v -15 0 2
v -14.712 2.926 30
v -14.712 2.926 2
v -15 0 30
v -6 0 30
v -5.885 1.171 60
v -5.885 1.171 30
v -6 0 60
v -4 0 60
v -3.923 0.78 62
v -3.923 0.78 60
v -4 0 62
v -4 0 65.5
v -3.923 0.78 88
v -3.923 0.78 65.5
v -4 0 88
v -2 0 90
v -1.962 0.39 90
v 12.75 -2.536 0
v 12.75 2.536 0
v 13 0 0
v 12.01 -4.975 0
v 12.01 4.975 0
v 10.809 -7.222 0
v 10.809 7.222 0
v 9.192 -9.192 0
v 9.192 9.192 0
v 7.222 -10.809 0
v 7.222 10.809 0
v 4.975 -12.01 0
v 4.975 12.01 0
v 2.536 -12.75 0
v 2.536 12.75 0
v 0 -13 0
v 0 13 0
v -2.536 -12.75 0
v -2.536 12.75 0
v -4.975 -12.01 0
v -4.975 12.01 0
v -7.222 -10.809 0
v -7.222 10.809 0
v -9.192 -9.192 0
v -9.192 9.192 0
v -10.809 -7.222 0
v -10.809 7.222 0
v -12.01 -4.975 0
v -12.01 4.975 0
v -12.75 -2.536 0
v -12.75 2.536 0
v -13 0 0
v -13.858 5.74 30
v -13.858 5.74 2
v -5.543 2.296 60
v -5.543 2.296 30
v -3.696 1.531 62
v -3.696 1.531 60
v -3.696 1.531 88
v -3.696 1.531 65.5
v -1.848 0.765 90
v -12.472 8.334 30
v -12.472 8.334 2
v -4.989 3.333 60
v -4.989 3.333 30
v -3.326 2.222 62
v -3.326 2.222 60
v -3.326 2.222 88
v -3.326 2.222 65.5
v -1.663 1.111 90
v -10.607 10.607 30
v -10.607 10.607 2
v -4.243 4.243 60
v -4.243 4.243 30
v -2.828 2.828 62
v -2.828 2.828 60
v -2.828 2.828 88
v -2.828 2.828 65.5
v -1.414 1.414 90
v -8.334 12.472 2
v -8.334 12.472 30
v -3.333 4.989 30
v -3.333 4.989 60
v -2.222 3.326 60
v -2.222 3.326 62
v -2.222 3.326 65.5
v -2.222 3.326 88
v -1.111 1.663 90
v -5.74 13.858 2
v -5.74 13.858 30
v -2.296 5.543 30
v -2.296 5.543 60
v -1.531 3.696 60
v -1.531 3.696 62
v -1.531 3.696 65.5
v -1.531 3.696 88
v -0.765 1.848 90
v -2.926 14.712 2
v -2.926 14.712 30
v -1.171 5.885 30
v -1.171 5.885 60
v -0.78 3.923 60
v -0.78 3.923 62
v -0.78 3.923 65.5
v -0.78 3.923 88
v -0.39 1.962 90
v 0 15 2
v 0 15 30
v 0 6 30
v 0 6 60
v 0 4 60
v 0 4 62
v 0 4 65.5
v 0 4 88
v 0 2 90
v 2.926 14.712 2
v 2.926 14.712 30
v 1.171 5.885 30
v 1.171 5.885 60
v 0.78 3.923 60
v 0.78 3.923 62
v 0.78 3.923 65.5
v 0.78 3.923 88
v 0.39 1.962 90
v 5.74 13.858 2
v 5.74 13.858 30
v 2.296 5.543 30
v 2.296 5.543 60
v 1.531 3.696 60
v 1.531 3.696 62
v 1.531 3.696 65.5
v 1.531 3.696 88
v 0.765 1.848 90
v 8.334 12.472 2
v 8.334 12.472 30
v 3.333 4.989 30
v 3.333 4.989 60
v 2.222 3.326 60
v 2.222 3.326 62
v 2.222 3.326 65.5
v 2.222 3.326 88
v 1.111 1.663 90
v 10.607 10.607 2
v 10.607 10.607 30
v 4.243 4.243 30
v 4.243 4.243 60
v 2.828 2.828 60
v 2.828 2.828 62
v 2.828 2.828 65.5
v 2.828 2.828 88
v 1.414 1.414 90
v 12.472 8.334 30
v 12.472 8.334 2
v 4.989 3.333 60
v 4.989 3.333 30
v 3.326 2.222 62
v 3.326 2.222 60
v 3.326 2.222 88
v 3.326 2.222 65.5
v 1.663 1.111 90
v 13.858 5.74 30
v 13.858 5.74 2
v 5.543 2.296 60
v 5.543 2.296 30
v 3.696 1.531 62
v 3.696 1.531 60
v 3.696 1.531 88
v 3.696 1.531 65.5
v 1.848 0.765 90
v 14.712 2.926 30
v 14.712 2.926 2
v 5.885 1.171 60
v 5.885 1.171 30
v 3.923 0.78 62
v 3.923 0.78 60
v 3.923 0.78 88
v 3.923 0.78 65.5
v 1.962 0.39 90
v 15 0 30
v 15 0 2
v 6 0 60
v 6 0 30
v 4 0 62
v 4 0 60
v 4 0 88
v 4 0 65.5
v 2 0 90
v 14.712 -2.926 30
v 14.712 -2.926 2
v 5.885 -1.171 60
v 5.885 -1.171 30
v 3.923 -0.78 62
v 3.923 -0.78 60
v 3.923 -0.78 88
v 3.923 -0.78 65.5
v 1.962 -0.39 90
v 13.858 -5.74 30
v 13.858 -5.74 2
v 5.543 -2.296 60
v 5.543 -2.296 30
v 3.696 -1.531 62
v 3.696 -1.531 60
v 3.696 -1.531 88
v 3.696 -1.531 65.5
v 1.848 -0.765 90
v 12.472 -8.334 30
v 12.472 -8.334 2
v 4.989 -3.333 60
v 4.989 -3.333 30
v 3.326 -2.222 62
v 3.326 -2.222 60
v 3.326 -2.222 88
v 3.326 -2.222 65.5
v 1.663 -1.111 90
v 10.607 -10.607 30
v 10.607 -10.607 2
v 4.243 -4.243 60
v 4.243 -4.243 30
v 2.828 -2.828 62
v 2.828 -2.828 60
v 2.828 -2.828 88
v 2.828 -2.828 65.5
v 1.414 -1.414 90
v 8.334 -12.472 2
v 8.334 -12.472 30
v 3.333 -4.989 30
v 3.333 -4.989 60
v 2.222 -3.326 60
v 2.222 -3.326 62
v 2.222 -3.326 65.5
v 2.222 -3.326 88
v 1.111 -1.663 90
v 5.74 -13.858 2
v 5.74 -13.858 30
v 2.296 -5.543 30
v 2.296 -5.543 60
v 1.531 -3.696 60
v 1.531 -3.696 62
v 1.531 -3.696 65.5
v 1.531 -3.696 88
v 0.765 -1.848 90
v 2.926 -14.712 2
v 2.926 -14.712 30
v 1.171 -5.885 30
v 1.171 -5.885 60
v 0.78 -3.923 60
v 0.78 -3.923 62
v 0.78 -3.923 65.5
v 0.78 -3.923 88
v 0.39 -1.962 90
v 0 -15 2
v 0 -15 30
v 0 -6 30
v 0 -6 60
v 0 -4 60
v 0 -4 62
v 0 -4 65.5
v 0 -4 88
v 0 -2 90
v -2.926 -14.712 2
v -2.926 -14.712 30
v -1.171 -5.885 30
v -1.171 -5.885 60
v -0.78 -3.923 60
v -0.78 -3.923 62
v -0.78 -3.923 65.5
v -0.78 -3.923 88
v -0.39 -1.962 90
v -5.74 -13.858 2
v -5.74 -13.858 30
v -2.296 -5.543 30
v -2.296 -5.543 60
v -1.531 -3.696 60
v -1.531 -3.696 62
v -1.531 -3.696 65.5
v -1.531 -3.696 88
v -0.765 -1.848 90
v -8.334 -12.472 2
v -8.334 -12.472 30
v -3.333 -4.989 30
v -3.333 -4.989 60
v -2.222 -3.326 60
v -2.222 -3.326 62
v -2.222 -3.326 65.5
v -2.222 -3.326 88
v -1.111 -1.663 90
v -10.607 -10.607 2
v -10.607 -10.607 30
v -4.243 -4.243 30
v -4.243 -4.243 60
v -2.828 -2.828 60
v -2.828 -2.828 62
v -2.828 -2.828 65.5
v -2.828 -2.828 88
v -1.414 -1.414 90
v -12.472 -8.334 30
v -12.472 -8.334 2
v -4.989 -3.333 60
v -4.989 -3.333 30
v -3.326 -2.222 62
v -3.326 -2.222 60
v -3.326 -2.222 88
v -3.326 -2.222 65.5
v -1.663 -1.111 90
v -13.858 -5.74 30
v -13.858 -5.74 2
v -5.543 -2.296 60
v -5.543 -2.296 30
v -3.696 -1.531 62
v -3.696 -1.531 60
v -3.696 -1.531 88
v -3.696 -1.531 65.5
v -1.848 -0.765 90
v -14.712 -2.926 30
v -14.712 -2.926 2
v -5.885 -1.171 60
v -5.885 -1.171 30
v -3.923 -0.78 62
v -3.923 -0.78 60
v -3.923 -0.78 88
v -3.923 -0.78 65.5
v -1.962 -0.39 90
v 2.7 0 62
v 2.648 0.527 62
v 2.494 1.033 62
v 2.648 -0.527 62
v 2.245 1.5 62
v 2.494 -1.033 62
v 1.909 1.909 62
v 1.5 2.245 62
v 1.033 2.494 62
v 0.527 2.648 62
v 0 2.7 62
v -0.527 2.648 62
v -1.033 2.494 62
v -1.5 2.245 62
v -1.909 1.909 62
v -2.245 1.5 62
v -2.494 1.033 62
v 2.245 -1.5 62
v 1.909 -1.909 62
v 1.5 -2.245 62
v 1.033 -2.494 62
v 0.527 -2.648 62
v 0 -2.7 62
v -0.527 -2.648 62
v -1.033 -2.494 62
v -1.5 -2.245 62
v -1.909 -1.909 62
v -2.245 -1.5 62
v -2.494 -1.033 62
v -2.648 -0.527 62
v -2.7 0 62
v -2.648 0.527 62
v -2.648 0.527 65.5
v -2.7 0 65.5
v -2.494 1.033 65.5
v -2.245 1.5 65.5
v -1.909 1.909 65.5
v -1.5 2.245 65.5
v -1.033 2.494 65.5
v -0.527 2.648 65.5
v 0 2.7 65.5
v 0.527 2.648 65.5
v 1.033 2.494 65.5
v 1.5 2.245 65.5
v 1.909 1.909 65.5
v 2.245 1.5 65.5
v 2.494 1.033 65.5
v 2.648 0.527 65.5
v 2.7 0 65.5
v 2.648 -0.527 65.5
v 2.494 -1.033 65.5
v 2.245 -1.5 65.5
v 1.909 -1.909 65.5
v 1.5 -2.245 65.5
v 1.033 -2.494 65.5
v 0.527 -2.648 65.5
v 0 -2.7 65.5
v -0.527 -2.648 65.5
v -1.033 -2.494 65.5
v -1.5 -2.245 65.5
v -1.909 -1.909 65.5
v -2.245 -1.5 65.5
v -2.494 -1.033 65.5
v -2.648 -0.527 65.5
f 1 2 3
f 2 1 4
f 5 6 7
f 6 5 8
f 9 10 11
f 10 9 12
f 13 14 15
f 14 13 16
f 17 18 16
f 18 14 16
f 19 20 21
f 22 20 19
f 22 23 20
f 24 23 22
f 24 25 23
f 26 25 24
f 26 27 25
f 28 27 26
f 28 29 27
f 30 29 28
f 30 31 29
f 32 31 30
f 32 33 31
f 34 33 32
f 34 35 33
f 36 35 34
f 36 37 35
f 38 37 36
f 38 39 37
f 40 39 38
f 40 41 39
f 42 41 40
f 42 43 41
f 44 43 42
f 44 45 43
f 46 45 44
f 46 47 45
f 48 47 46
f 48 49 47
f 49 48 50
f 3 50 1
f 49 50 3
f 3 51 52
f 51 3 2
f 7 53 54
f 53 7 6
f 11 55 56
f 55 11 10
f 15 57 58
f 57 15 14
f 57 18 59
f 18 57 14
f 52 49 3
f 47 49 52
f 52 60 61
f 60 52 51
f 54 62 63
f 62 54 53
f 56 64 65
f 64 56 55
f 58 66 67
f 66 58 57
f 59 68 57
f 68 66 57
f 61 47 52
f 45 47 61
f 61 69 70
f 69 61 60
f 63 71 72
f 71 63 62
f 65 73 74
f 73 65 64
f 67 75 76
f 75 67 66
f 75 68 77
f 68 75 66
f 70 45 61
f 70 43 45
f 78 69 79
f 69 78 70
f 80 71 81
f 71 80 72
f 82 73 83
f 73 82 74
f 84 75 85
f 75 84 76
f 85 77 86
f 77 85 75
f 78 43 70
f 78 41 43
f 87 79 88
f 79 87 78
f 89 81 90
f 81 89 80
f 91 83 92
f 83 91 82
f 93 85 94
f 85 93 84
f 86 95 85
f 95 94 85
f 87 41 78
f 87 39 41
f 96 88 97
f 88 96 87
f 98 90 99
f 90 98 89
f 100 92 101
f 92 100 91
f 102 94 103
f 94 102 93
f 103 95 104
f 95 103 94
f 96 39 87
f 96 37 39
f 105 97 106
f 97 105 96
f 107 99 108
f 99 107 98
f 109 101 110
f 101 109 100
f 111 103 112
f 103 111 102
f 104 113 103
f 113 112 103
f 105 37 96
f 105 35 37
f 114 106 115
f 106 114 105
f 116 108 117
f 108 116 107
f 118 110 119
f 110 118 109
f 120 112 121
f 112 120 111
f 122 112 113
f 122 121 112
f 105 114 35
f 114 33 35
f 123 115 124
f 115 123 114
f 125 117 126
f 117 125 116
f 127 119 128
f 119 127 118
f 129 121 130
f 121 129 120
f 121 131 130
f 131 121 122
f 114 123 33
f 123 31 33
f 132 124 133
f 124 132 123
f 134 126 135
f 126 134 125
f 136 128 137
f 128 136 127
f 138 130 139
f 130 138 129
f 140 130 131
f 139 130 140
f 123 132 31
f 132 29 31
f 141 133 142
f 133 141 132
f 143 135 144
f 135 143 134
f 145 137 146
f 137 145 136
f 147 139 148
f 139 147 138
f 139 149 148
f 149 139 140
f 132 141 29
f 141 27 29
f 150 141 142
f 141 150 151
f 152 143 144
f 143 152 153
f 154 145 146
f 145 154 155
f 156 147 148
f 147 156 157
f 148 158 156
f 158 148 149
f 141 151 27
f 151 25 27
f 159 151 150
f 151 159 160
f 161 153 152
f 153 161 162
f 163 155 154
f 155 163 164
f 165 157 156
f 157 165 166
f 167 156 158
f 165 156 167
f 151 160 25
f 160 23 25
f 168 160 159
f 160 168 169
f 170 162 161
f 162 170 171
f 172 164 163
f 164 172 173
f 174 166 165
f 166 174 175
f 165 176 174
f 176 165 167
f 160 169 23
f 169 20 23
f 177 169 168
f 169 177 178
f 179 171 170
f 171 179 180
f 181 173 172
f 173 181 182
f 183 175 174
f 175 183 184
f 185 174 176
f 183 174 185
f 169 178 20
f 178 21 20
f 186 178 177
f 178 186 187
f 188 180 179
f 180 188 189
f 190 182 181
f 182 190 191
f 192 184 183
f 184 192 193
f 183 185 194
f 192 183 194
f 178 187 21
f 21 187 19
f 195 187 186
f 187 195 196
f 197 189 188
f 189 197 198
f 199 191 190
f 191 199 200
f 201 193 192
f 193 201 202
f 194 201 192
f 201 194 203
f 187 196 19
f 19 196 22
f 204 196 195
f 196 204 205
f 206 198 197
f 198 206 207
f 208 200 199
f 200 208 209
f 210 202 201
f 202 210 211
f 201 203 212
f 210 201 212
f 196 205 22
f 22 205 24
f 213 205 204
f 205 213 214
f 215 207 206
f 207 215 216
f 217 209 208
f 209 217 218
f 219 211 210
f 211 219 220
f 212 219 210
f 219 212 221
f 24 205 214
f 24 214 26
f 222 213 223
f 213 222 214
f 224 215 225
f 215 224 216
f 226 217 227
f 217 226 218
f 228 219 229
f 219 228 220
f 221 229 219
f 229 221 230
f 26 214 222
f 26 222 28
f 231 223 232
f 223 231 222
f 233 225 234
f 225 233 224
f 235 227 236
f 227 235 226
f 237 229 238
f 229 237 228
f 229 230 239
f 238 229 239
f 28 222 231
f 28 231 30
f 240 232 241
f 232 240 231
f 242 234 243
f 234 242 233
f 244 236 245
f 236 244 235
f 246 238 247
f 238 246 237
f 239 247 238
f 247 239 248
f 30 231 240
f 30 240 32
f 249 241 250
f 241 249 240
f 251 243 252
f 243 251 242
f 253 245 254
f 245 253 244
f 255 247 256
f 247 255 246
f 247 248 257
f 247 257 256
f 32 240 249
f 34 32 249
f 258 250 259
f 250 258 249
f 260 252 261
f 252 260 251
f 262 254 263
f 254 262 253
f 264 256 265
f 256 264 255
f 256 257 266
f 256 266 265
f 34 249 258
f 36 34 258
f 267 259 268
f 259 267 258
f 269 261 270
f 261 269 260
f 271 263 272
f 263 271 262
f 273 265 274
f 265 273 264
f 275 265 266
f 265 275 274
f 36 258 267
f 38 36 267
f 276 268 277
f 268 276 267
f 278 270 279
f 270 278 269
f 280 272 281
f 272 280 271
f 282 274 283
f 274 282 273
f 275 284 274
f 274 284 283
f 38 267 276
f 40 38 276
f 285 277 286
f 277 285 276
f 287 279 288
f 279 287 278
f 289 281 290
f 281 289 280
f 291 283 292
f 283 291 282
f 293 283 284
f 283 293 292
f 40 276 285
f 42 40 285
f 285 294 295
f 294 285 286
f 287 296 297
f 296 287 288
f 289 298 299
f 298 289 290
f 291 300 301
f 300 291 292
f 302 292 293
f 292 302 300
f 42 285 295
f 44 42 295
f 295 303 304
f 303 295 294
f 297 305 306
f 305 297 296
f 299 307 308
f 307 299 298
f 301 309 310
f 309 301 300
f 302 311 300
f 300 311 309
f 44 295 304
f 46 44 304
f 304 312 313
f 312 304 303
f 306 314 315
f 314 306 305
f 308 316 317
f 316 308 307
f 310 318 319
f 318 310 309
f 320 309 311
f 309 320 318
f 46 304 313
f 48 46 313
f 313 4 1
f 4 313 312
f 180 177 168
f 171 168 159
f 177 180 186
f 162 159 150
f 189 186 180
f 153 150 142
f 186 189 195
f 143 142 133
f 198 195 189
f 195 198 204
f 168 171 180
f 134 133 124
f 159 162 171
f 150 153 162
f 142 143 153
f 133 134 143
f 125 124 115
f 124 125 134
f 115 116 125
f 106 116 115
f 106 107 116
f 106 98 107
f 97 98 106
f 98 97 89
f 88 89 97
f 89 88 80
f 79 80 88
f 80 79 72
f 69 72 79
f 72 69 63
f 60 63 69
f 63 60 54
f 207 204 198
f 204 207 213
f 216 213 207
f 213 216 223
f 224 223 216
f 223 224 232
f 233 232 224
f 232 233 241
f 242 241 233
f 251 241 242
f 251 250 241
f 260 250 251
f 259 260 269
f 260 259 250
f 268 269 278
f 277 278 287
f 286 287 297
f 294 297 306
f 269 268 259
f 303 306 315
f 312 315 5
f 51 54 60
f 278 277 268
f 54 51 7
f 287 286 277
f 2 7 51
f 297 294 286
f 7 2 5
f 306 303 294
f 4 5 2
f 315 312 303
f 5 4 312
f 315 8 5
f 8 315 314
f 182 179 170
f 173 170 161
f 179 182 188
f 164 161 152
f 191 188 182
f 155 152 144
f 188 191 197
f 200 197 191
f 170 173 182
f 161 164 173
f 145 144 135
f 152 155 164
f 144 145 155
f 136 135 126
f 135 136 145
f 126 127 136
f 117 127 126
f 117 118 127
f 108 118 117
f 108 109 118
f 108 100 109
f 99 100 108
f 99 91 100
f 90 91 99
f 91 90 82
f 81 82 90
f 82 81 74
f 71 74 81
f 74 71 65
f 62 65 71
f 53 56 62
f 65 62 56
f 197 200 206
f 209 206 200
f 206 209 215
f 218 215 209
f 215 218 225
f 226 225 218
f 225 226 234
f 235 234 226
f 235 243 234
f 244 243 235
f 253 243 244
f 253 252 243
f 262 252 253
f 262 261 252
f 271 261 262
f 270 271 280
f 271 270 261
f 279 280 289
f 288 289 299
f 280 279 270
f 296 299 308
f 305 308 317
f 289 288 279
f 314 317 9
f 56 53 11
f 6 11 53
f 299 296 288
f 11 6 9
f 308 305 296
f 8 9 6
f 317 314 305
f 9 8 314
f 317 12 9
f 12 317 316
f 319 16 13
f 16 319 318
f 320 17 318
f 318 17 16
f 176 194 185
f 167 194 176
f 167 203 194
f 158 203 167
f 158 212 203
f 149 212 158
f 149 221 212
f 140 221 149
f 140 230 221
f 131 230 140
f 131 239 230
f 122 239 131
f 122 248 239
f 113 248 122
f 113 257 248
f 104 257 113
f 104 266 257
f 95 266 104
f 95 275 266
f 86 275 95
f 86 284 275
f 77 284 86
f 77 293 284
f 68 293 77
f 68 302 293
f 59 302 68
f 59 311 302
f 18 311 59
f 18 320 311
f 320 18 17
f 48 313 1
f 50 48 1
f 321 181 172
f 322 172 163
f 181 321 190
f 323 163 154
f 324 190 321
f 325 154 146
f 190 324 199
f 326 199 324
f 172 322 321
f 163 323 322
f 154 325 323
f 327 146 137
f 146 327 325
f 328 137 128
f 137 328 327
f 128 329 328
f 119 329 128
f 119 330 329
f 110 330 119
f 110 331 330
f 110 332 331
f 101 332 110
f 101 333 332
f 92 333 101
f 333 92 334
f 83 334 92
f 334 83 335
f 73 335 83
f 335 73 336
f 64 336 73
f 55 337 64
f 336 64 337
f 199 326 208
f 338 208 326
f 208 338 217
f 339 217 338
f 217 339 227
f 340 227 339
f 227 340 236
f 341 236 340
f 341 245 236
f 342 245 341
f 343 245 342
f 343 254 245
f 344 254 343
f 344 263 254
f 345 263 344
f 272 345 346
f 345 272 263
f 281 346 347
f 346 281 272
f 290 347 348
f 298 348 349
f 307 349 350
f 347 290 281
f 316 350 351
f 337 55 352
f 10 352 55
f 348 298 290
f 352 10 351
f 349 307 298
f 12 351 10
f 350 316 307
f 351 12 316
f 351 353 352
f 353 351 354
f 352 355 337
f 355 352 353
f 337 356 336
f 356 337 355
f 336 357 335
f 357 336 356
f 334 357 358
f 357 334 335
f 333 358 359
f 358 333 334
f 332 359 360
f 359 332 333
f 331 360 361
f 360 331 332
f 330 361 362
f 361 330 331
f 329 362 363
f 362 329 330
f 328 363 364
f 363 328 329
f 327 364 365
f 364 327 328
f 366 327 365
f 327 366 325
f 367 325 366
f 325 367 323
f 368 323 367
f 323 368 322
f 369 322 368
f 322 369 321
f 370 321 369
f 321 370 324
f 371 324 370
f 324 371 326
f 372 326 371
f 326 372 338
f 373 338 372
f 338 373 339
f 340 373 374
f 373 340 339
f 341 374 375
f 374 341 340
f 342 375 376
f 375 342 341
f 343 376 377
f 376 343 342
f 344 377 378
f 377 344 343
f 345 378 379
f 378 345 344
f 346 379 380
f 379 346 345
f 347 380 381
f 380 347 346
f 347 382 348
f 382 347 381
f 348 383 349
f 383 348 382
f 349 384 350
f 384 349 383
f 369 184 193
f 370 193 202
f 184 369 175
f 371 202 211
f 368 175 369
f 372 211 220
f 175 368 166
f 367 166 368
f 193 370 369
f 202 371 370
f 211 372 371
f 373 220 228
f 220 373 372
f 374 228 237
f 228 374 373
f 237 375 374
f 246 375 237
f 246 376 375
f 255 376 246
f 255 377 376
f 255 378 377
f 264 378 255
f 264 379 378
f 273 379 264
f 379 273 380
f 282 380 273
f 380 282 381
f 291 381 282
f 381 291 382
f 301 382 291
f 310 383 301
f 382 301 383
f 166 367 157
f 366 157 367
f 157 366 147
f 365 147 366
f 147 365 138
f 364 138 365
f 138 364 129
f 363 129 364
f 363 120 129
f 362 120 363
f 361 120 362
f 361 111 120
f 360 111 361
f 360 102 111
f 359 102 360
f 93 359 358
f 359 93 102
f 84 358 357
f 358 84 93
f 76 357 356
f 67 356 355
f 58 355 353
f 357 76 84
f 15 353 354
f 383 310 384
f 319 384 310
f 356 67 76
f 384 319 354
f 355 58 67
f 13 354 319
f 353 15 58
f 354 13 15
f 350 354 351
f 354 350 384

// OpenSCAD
$fn = 32;

// ----------------------------------------------------------------------
// Stepped shaft: diameters 30, 12, 8 mm, 90 mm long
// ----------------------------------------------------------------------

// --- parameters (mm) ---
d1 = 30;                  // step 1 diameter
len1 = 30;                // step 1 length
d2 = 12;                  // step 2 diameter
len2 = 30;                // step 2 length
d3 = 8;                   // step 3 diameter
len3 = 30;                // step 3 length
total = 90;               // overall length
chamfer = 2;              // end chamfer
groove_r = 4;             // groove radius
groove_z = 62;            // groove position from the end
groove_w = 3.5;           // groove width
groove_d = 1.3;           // groove depth

/* closed turning profile: x is the radius, y is the length */
profile = [[0, 0], [15 - chamfer, 0], [15, chamfer], [15, 30], [6, 30], [6, 60], [4, 60], [4, 88], [2, 90], [0, 90]];

difference() {
  rotate_extrude() polygon(profile);
  /* circlip groove just behind the shoulder */
  rotate_extrude() translate([groove_r - groove_d, groove_z]) square([groove_d + 1, groove_w]);
}
